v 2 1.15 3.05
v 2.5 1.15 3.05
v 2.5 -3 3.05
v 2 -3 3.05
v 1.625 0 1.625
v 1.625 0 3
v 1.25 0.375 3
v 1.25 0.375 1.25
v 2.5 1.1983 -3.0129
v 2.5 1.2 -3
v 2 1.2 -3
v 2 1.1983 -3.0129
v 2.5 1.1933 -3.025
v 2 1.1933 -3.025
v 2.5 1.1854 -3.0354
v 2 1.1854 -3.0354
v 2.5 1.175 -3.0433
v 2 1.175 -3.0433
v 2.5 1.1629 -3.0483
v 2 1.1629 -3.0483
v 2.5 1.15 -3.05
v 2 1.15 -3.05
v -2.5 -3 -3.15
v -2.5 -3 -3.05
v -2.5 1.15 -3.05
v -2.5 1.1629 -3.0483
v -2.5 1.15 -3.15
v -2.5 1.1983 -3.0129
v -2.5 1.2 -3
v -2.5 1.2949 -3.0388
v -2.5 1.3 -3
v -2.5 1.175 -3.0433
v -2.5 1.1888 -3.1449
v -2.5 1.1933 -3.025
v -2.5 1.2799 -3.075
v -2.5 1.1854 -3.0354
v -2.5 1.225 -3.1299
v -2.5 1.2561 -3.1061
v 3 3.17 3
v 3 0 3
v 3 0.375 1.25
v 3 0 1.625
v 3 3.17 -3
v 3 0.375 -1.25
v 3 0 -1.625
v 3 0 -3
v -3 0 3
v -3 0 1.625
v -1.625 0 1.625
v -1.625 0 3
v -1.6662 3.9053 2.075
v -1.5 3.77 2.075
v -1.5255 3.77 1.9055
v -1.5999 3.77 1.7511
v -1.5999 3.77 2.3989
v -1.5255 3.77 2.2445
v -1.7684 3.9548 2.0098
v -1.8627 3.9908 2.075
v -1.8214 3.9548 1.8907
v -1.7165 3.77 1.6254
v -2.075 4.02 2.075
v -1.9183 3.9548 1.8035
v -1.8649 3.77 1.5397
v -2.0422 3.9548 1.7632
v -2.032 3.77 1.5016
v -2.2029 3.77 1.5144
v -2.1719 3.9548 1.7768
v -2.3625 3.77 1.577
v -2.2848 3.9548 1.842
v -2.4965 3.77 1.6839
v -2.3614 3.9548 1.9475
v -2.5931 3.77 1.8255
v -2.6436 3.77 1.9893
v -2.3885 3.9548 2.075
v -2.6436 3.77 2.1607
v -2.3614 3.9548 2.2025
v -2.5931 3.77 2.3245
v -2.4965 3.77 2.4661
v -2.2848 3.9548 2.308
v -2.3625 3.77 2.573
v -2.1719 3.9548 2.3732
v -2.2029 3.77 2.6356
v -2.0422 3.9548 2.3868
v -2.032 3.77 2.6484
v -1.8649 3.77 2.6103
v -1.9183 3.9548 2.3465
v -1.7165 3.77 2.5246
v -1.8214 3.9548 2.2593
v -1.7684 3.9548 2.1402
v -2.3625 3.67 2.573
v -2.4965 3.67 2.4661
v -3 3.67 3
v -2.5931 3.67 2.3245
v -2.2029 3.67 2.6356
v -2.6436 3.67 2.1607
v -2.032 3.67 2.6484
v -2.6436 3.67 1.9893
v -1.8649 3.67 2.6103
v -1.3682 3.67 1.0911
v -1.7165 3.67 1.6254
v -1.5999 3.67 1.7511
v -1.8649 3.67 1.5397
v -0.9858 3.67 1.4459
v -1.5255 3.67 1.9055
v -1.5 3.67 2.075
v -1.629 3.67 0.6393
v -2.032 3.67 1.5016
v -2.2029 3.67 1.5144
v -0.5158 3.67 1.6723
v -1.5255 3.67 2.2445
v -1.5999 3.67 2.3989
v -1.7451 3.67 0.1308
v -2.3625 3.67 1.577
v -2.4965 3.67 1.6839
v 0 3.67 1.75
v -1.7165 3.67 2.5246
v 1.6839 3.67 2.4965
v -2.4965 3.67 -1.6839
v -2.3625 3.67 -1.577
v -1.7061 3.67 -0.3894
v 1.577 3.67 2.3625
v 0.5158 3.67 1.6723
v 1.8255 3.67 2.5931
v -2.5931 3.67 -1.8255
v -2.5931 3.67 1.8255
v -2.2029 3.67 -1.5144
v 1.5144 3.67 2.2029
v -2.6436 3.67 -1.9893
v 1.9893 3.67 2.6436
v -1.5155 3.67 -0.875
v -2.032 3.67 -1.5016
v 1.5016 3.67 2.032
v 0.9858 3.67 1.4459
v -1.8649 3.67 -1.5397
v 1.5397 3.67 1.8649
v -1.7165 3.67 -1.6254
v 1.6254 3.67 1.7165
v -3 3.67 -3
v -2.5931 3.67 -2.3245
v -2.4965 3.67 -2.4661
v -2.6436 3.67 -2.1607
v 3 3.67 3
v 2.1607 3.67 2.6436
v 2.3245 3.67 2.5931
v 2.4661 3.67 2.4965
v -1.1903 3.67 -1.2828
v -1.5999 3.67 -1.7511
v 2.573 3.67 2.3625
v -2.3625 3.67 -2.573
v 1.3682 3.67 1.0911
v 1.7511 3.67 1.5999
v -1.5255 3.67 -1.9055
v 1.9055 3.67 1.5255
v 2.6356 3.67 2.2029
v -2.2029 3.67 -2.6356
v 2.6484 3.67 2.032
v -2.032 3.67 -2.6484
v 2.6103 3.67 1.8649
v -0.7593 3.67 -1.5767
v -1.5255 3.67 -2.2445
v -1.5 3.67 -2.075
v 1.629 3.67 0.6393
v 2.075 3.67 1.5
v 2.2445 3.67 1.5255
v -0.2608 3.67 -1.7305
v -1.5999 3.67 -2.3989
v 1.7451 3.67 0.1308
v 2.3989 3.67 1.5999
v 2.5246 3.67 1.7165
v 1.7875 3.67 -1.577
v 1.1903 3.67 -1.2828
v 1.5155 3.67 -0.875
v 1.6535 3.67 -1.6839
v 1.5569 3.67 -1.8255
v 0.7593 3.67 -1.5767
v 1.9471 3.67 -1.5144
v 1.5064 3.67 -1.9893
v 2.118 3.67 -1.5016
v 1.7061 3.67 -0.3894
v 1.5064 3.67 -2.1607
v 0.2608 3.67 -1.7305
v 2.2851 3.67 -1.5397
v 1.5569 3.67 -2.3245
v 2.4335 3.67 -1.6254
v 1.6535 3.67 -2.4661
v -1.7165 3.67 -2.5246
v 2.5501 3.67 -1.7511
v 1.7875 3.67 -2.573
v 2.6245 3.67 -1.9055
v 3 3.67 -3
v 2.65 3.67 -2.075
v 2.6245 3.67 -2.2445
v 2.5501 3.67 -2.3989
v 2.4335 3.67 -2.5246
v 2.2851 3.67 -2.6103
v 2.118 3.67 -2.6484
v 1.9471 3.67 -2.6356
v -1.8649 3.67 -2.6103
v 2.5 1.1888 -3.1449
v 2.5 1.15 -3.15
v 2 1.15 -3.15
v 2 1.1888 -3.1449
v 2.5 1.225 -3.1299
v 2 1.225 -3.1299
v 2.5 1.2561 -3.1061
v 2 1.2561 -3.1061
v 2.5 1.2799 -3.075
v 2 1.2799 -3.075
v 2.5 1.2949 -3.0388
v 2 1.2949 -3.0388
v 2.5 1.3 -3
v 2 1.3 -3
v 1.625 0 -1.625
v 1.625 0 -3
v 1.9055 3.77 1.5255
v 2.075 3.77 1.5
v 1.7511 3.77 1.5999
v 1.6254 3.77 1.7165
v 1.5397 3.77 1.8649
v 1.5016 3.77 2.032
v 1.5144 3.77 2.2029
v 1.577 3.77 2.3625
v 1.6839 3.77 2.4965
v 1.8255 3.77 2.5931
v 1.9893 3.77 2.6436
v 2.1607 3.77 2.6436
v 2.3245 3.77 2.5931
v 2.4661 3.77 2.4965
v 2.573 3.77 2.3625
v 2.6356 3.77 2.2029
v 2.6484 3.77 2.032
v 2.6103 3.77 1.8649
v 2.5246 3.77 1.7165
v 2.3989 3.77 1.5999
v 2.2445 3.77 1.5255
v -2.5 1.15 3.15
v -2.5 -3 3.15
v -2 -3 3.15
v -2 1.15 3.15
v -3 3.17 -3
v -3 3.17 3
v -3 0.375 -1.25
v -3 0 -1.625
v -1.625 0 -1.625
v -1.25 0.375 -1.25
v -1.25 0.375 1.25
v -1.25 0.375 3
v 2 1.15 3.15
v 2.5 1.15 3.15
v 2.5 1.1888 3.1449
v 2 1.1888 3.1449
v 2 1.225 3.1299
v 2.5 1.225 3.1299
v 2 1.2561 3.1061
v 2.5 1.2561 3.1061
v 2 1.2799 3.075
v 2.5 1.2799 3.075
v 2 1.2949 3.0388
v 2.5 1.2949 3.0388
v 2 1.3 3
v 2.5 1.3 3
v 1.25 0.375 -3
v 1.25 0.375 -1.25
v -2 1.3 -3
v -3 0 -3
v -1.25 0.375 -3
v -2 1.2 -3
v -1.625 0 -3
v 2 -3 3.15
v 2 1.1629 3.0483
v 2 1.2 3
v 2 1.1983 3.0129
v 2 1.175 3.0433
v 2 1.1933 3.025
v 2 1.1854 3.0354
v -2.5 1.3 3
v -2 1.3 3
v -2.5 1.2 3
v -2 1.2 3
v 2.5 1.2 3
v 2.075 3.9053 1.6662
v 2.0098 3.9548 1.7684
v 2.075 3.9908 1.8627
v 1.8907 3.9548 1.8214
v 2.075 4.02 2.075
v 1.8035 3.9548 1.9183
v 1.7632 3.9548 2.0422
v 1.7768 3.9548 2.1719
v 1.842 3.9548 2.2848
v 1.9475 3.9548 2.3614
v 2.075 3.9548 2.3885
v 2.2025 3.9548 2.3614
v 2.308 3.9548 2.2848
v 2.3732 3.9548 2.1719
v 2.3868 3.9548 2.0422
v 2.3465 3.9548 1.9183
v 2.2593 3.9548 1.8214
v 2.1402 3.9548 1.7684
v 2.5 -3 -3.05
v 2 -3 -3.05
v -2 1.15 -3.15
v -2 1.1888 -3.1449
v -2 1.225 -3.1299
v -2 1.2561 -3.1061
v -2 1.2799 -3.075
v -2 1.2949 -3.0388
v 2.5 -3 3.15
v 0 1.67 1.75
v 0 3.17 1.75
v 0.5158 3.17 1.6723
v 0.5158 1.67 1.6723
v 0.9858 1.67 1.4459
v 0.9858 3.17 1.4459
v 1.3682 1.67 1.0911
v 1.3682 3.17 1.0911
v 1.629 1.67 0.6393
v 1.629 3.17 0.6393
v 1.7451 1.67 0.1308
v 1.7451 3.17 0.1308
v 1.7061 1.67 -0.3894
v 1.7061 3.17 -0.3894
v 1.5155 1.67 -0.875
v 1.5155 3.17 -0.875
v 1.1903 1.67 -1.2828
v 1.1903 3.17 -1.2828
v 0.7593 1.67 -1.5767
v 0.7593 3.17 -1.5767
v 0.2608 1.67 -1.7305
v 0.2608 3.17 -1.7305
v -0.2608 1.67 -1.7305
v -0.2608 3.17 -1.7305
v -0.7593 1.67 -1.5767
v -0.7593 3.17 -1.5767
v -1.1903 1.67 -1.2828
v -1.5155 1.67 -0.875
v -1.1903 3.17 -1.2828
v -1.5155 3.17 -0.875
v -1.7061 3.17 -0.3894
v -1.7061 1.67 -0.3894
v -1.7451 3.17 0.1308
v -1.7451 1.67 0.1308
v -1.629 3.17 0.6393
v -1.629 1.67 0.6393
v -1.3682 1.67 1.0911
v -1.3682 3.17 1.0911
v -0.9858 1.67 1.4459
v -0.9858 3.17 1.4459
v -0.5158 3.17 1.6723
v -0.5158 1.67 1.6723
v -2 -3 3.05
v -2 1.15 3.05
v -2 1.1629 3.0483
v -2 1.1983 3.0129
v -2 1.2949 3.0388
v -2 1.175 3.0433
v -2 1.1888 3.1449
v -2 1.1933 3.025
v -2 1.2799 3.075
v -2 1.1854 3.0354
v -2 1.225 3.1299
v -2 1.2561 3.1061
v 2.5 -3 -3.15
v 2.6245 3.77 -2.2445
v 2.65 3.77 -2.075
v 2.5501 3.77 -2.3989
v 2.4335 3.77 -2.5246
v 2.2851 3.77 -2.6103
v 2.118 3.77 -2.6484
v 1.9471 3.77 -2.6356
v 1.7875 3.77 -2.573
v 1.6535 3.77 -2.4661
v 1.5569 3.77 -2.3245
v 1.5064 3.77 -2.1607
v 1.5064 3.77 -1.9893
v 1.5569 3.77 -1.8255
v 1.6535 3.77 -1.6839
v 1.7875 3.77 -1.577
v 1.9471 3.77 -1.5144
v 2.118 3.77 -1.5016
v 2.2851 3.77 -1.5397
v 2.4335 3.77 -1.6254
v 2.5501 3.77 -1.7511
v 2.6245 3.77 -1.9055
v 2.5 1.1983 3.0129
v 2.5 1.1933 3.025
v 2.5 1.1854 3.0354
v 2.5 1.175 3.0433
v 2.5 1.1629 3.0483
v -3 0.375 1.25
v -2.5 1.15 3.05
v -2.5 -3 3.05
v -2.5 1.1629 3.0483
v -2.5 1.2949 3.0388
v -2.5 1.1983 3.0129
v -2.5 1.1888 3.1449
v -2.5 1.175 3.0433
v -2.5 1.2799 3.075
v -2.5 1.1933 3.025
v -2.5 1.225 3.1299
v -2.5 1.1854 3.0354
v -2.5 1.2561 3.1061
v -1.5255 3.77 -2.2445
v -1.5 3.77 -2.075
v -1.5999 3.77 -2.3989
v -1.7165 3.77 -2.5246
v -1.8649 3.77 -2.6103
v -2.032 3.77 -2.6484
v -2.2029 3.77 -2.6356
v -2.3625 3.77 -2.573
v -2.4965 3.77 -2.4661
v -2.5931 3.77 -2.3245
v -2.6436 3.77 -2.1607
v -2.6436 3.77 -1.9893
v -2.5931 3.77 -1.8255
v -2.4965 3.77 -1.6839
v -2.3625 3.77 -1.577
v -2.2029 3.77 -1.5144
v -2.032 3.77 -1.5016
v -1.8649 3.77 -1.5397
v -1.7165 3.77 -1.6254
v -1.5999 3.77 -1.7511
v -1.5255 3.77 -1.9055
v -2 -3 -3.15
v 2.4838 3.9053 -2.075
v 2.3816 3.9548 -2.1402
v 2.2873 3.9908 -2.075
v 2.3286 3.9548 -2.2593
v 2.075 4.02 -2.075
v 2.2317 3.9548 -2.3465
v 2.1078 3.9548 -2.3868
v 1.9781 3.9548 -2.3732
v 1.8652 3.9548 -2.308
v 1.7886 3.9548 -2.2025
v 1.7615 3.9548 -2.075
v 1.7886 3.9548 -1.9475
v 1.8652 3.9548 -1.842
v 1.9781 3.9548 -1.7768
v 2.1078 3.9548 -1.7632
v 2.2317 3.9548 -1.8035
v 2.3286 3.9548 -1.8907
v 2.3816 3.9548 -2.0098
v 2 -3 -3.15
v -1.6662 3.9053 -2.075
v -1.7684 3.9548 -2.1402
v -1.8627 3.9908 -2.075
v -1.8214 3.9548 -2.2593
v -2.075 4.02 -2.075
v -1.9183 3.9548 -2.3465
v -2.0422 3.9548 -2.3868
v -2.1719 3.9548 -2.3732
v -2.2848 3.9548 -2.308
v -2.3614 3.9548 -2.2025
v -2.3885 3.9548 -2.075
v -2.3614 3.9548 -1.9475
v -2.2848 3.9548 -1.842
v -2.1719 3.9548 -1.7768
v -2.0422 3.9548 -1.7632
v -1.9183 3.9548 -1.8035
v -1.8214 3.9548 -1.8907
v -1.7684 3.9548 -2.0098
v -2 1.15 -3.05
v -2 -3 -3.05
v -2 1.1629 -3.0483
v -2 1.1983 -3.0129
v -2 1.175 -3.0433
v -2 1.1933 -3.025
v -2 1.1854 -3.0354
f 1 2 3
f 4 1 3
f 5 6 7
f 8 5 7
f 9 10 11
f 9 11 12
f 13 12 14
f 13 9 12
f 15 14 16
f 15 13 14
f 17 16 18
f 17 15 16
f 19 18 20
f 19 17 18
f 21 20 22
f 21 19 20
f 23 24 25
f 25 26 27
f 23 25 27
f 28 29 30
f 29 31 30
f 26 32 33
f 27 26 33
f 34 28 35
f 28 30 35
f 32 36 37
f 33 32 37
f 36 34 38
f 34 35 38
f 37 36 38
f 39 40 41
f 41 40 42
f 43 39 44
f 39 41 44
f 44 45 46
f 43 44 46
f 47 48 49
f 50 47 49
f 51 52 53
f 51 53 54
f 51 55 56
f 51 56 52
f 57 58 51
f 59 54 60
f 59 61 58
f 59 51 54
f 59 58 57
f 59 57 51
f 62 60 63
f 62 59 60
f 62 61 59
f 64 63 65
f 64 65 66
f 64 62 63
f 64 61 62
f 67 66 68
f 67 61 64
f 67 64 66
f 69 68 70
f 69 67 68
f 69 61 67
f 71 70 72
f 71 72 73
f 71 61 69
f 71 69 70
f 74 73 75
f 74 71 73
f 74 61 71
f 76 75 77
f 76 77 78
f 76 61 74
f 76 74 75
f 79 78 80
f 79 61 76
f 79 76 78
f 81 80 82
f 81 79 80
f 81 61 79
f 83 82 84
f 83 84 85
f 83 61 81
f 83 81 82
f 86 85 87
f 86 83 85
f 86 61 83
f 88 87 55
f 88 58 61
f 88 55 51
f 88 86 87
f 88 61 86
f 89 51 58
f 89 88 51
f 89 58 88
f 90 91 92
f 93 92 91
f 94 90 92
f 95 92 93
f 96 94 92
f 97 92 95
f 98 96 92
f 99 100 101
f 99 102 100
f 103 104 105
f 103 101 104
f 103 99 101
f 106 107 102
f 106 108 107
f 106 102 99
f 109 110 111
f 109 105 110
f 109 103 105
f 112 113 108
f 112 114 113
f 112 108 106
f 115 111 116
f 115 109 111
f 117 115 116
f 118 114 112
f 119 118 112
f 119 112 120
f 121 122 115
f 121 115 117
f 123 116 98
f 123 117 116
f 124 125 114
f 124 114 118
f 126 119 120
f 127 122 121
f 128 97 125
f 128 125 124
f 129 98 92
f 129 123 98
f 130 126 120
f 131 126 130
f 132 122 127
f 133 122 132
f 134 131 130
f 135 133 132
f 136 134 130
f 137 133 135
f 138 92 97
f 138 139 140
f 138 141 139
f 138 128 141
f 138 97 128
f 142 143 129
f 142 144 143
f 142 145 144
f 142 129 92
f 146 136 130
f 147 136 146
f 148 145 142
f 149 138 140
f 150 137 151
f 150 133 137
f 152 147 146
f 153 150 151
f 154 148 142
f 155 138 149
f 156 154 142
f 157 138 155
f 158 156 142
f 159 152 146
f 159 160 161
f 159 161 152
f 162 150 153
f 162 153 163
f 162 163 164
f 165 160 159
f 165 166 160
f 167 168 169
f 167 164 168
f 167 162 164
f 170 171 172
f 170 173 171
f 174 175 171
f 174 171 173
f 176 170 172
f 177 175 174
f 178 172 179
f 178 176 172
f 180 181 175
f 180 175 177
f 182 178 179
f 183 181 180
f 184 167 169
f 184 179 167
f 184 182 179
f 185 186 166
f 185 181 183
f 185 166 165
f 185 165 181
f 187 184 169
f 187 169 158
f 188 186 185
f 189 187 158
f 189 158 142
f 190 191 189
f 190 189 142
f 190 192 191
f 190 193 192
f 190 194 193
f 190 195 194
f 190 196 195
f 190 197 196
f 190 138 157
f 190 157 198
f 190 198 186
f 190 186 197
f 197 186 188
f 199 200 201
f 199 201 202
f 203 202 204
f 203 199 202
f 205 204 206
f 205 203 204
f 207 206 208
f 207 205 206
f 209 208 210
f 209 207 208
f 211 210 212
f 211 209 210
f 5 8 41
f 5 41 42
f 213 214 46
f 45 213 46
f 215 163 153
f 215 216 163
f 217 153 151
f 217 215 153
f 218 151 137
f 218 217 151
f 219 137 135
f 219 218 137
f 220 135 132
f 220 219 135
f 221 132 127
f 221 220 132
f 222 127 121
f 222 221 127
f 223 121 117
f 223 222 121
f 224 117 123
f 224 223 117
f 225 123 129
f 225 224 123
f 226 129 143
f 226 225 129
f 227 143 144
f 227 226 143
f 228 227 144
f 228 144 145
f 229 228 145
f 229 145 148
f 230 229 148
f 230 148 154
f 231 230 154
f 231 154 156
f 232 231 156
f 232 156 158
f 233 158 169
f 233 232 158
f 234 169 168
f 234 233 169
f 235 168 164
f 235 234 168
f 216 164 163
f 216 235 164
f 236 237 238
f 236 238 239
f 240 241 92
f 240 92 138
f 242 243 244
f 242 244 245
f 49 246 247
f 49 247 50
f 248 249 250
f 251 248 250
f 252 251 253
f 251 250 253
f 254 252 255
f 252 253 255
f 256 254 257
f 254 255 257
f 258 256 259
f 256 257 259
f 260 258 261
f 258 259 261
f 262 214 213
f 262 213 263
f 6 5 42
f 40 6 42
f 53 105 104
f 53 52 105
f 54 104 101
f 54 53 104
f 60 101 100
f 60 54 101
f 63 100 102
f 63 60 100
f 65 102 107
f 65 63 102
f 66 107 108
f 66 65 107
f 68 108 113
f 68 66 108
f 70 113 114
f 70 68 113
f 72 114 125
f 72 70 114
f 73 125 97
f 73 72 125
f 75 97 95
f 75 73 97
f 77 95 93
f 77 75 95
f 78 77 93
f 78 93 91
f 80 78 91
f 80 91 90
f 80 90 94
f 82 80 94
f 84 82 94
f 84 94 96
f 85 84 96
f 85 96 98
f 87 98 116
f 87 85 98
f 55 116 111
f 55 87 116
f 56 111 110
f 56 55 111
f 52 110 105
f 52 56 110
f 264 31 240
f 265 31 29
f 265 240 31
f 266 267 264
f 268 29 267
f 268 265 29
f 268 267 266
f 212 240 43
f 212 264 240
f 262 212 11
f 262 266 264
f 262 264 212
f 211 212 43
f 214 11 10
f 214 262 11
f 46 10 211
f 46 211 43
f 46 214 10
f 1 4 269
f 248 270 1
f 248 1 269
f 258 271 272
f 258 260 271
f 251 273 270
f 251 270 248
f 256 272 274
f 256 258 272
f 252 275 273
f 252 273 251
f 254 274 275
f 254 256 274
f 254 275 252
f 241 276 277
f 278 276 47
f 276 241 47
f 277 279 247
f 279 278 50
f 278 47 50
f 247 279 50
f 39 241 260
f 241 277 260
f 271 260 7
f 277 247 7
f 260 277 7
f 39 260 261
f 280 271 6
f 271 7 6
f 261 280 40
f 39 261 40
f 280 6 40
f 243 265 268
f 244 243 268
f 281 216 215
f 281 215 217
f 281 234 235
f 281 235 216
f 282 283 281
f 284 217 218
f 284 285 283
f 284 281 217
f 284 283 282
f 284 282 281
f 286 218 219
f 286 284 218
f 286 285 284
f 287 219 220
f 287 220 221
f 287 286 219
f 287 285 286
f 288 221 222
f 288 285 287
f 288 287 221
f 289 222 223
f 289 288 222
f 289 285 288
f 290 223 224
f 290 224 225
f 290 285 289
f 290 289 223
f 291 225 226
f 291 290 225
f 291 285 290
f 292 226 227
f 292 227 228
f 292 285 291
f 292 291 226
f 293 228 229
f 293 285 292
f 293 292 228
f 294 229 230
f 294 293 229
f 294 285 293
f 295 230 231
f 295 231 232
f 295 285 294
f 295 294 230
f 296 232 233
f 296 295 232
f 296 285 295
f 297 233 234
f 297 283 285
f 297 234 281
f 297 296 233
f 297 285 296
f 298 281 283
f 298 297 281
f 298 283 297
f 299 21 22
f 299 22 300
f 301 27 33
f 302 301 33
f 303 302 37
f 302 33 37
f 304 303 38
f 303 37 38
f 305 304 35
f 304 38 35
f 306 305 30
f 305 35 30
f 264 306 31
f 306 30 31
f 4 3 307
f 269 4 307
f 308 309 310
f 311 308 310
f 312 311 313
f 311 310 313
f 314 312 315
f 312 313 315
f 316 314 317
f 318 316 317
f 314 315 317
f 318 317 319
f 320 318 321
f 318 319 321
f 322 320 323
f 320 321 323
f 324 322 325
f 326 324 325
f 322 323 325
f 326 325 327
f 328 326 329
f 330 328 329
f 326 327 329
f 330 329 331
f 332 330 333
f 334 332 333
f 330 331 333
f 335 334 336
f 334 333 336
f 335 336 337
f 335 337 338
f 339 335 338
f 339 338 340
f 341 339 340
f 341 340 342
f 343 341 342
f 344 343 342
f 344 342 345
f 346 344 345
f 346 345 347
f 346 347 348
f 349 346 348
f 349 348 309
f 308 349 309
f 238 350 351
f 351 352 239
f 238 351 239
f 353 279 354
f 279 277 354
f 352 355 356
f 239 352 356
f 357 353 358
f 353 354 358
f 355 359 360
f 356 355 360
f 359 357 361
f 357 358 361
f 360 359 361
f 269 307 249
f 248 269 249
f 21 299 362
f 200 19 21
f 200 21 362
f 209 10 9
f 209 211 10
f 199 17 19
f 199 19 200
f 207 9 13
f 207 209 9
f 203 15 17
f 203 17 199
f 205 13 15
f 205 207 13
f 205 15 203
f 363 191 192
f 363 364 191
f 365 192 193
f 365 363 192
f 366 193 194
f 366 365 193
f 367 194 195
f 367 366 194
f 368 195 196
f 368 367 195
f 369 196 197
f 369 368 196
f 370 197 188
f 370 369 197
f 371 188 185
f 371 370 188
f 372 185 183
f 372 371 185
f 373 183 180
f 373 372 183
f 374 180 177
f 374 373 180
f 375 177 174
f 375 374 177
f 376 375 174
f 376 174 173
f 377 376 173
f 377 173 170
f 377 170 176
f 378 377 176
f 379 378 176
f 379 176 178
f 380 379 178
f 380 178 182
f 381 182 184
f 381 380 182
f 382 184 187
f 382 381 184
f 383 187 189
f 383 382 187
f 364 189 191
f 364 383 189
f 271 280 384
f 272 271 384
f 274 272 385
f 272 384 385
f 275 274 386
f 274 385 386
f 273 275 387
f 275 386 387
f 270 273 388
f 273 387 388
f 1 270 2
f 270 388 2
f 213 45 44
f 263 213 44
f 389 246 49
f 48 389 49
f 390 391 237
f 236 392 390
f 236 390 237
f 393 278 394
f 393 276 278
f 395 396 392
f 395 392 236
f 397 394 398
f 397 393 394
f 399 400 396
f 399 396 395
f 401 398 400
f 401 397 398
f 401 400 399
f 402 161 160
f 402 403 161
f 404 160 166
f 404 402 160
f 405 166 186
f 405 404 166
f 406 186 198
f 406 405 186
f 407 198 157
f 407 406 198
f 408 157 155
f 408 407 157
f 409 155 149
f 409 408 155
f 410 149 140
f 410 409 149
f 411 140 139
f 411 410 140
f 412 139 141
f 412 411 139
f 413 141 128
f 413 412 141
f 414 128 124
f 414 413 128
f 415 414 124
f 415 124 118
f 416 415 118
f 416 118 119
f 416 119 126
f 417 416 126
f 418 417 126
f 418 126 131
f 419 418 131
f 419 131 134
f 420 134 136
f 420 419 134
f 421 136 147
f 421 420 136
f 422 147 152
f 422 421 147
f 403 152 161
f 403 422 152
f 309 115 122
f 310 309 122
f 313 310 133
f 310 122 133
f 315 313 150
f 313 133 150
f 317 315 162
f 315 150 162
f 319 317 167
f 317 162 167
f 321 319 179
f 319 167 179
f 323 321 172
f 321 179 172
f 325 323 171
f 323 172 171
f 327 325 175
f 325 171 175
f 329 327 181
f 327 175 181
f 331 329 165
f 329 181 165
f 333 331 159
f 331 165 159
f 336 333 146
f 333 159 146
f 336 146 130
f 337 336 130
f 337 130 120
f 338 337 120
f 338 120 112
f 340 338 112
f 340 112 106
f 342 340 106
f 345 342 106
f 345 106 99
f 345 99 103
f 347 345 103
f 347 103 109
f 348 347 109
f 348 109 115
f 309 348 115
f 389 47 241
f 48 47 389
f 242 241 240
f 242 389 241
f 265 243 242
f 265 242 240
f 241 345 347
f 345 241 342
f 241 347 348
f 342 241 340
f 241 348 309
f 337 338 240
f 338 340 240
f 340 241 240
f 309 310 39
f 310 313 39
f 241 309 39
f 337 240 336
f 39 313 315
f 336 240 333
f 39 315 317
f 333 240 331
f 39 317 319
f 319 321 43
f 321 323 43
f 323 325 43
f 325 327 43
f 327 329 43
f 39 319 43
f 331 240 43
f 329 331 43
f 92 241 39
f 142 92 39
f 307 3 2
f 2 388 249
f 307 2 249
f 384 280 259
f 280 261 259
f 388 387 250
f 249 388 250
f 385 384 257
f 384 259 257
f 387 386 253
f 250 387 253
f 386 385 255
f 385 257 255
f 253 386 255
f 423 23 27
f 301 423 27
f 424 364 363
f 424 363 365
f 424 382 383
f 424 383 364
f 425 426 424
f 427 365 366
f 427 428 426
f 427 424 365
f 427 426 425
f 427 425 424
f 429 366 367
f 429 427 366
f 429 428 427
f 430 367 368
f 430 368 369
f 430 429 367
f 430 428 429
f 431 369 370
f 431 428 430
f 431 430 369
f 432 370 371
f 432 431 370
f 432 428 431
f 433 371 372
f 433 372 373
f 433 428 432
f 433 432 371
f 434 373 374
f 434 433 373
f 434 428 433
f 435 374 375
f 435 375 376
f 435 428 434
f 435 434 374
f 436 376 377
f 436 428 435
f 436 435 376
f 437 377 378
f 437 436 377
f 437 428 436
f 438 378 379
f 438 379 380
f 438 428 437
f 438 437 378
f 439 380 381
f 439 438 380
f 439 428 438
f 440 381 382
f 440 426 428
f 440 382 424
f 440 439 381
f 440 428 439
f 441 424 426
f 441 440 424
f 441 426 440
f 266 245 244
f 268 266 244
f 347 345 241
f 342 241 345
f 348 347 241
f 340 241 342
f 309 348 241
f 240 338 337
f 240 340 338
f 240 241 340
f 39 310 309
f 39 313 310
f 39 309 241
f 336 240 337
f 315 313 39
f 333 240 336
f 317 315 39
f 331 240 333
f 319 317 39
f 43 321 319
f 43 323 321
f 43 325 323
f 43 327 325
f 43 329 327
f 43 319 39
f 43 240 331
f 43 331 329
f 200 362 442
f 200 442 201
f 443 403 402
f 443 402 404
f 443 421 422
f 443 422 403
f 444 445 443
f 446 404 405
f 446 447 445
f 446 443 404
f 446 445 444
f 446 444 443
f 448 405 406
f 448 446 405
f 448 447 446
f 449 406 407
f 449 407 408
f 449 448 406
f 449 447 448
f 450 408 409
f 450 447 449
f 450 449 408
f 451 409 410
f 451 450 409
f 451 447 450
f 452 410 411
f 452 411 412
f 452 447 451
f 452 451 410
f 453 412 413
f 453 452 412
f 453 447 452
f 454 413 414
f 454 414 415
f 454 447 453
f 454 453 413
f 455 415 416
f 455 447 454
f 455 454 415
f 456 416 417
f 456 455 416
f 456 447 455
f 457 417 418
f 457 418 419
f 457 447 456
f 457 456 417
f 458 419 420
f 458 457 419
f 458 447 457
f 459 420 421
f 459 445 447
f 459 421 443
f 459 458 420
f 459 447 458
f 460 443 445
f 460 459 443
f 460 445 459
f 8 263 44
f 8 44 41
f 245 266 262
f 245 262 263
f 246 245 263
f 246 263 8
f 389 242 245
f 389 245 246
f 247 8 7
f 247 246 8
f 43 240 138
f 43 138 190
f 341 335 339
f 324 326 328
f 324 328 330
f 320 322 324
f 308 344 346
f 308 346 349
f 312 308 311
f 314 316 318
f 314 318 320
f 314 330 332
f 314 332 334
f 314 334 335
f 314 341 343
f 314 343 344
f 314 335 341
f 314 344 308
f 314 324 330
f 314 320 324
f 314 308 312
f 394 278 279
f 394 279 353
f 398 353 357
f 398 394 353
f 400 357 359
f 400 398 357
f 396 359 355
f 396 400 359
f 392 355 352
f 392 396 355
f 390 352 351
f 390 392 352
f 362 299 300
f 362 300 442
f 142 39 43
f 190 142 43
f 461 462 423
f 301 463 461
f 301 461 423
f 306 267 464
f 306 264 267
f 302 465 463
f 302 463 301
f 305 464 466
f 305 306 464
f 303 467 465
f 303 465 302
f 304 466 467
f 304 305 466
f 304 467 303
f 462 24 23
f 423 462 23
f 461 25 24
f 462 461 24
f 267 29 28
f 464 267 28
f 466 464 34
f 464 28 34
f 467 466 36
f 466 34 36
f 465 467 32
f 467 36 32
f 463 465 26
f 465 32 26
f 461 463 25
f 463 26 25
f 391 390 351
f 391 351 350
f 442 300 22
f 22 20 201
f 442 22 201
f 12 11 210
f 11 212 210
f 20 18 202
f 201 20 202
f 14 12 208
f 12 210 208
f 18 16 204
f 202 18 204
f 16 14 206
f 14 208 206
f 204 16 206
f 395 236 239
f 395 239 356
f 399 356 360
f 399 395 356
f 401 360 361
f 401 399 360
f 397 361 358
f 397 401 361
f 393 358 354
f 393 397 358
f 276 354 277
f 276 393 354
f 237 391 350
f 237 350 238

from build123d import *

# Parameters (mm, degrees)
SKETCH1_W                                = 6
SKETCH1_H                                = 6
BOSS_EXTRUDE1_DEPTH                      = 3.17
SKETCH2_W                                = 6
SKETCH2_H                                = 6
BOSS_EXTRUDE2_DEPTH                      = 0.5
SKETCH5_R                                = 1.75
CUT_EXTRUDE1_DEPTH                       = 2
EXTRUDE_THIN1_DEPTH                      = 0.5
MIRROR1_AT_THE_SECOND_PLANE_COPY_1_DEPTH = 0.5
CUT_EXTRUDE4_DEPTH                       = 8.879270271
CIRPATTERN1_COUNT                        = 2
CIRPATTERN1_ANGLE                        = 90


# Read off the part's stored shape, not the designer's step: Sketch-Pattern1
with BuildPart() as part:
    # Sketch1 → Boss-Extrude1 (new body)
    with BuildSketch(Plane(origin=(0, 0, 0), x_dir=(1, 0, 0), z_dir=(0, 1, 0))):
        Rectangle(SKETCH1_W, SKETCH1_H)
    extrude(amount=BOSS_EXTRUDE1_DEPTH)


with BuildPart() as body_2:
    # Sketch2 → Boss-Extrude2 (new body)
    with BuildSketch(Plane(origin=(0, 3.17, 0), x_dir=(1, 0, 0), z_dir=(0, 1, 0))):
        Rectangle(SKETCH2_W, SKETCH2_H)
    extrude(amount=BOSS_EXTRUDE2_DEPTH)

    # Sketch4 → Revolve1 (revolve)
    with BuildSketch(Plane.YZ.offset(2.075), mode=Mode.PRIVATE) as revolve1_sk:
        with BuildLine():
            Line((3.67, 2.65), (3.77, 2.65))
            ThreePointArc((3.77, 2.65), (3.954796332, 2.388498405), (4.02, 2.075))
            Line((4.02, 2.075), (3.67, 2.075))
            Line((3.67, 2.075), (3.17, 2.075))
            Line((3.17, 2.075), (3.17, 2.65))
            Line((3.17, 2.65), (3.67, 2.65))
        make_face()
    revolve(revolve1_sk.sketch.rotate(Axis((2.075, 3.67, 2.075), (0, 1, 0)), 180), axis=Axis((2.075, 3.67, 2.075), (0, 1, 0)))

    # Sketch-Pattern1 outline → Sketch-Pattern1 (revolve)
    with BuildSketch(Plane(origin=(-2.075, 0, 2.075), x_dir=(1, 0, 0), z_dir=(0, 0, 1))):
        with BuildLine():
            Line((0.575, 3.67), (0.575000001, 3.769999999))
            ThreePointArc((0.575000001, 3.769999999), (0.313498406, 3.954796332), (0, 4.02))
            Line((0, 4.02), (0, 3.67))
            Line((0, 3.67), (0.575, 3.67))
        make_face()
    revolve(axis=Axis((-2.075, 0, 2.075), (0, 1, 0)))

    # Sketch-Pattern1 2 outline → Sketch-Pattern1 2 (revolve)
    with BuildSketch(Plane(origin=(-2.075, 0, -2.075), x_dir=(1, 0, 0), z_dir=(0, 0, 1))):
        with BuildLine():
            Line((0.575, 3.67), (0.575000001, 3.769999999))
            ThreePointArc((0.575000001, 3.769999999), (0.313498406, 3.954796332), (0, 4.02))
            Line((0, 4.02), (0, 3.67))
            Line((0, 3.67), (0.575, 3.67))
        make_face()
    revolve(axis=Axis((-2.075, 0, -2.075), (0, 1, 0)))

    # Sketch-Pattern1 3 outline → Sketch-Pattern1 3 (revolve)
    with BuildSketch(Plane(origin=(2.075, 0, -2.075), x_dir=(1, 0, 0), z_dir=(0, 0, 1))):
        with BuildLine():
            Line((0.575, 3.67), (0.575000001, 3.769999999))
            ThreePointArc((0.575000001, 3.769999999), (0.313498406, 3.954796332), (0, 4.02))
            Line((0, 4.02), (0, 3.67))
            Line((0, 3.67), (0.575, 3.67))
        make_face()
    revolve(axis=Axis((2.075, 0, -2.075), (0, 1, 0)))


with BuildPart() as cut_extrude1_tool:
    # Sketch5 → Cut-Extrude1 (new body)
    with BuildSketch(Plane(origin=(0, 3.67, 0), x_dir=(1, 0, 0), z_dir=(0, 1, 0))):
        with Locations(Location((0, 0, 0), (0, 0, 270))):
            Circle(SKETCH5_R)
    extrude(amount=-CUT_EXTRUDE1_DEPTH)


with BuildPart() as part_1:
    add(part.part)

    # Cut-Extrude1: cut by cut_extrude1_tool
    add(cut_extrude1_tool.part, mode=Mode.SUBTRACT)

    # Sketch6 → Extrude-Thin1 (add)
    with BuildSketch(Plane.ZY.offset(2.5)):
        with BuildLine():
            ThreePointArc((3, 1.2), (3.035355348, 1.185355337), (3.05, 1.149999984))
            Line((3.05, 1.149999984), (3.05, -3))
            Line((3.05, -3), (3.15, -3))
            Line((3.15, -3), (3.15, 1.150000012))
            ThreePointArc((3.15, 1.150000012), (3.106066008, 1.256066033), (2.999999977, 1.3))
            Line((2.999999977, 1.3), (3, 1.2))
        make_face()
    extrude_thin1 = extrude(amount=-EXTRUDE_THIN1_DEPTH)

    # Mirror1: Extrude-Thin1 across plane
    add(extrude_thin1.mirror(Plane.XY))

    # Mirror1 at the second plane: Extrude-Thin1 across plane
    add(extrude_thin1.mirror(Plane(origin=(0, 0, 0), x_dir=(0, 0, 1), z_dir=(1, 0, 0))))

    # Mirror1 at the second plane copy 1 sketc → Mirror1 at the second plane copy 1 (add)
    with BuildSketch(Plane(origin=(2.5, 0, 0), x_dir=(0, 0, -1), z_dir=(1, 0, 0))):
        with BuildLine():
            ThreePointArc((3, 1.2), (3.035355348, 1.185355337), (3.05, 1.149999984))
            Line((3.05, 1.149999984), (3.05, -3))
            Line((3.05, -3), (3.15, -3))
            Line((3.15, -3), (3.15, 1.150000012))
            ThreePointArc((3.15, 1.150000012), (3.106066008, 1.256066033), (2.999999977, 1.3))
            Line((2.999999977, 1.3), (3, 1.2))
        make_face()
    extrude(amount=-MIRROR1_AT_THE_SECOND_PLANE_COPY_1_DEPTH)

    # Sketch7 → Cut-Extrude4 (cut, through all)
    with BuildSketch(Plane.ZY.offset(3)):
        Polygon((-1.625, 0), (-1.25, 0.375), (1.25, 0.375), (1.625, 0), align=None)
    cut_extrude4 = extrude(amount=-CUT_EXTRUDE4_DEPTH, mode=Mode.SUBTRACT)

    # CirPattern1: Cut-Extrude4 ×2 about axis
    cirpattern1_axis = Axis((0, 4.371, 0), (0, -1, 0))
    for i in range(1, CIRPATTERN1_COUNT):
        add(cut_extrude4.rotate(cirpattern1_axis, i * CIRPATTERN1_ANGLE / (CIRPATTERN1_COUNT - 1)), mode=Mode.SUBTRACT)


with BuildPart() as body_2_1:
    add(body_2.part)

    # Cut-Extrude1: cut by cut_extrude1_tool
    add(cut_extrude1_tool.part, mode=Mode.SUBTRACT)


solid = Compound([part_1.part, body_2_1.part])
